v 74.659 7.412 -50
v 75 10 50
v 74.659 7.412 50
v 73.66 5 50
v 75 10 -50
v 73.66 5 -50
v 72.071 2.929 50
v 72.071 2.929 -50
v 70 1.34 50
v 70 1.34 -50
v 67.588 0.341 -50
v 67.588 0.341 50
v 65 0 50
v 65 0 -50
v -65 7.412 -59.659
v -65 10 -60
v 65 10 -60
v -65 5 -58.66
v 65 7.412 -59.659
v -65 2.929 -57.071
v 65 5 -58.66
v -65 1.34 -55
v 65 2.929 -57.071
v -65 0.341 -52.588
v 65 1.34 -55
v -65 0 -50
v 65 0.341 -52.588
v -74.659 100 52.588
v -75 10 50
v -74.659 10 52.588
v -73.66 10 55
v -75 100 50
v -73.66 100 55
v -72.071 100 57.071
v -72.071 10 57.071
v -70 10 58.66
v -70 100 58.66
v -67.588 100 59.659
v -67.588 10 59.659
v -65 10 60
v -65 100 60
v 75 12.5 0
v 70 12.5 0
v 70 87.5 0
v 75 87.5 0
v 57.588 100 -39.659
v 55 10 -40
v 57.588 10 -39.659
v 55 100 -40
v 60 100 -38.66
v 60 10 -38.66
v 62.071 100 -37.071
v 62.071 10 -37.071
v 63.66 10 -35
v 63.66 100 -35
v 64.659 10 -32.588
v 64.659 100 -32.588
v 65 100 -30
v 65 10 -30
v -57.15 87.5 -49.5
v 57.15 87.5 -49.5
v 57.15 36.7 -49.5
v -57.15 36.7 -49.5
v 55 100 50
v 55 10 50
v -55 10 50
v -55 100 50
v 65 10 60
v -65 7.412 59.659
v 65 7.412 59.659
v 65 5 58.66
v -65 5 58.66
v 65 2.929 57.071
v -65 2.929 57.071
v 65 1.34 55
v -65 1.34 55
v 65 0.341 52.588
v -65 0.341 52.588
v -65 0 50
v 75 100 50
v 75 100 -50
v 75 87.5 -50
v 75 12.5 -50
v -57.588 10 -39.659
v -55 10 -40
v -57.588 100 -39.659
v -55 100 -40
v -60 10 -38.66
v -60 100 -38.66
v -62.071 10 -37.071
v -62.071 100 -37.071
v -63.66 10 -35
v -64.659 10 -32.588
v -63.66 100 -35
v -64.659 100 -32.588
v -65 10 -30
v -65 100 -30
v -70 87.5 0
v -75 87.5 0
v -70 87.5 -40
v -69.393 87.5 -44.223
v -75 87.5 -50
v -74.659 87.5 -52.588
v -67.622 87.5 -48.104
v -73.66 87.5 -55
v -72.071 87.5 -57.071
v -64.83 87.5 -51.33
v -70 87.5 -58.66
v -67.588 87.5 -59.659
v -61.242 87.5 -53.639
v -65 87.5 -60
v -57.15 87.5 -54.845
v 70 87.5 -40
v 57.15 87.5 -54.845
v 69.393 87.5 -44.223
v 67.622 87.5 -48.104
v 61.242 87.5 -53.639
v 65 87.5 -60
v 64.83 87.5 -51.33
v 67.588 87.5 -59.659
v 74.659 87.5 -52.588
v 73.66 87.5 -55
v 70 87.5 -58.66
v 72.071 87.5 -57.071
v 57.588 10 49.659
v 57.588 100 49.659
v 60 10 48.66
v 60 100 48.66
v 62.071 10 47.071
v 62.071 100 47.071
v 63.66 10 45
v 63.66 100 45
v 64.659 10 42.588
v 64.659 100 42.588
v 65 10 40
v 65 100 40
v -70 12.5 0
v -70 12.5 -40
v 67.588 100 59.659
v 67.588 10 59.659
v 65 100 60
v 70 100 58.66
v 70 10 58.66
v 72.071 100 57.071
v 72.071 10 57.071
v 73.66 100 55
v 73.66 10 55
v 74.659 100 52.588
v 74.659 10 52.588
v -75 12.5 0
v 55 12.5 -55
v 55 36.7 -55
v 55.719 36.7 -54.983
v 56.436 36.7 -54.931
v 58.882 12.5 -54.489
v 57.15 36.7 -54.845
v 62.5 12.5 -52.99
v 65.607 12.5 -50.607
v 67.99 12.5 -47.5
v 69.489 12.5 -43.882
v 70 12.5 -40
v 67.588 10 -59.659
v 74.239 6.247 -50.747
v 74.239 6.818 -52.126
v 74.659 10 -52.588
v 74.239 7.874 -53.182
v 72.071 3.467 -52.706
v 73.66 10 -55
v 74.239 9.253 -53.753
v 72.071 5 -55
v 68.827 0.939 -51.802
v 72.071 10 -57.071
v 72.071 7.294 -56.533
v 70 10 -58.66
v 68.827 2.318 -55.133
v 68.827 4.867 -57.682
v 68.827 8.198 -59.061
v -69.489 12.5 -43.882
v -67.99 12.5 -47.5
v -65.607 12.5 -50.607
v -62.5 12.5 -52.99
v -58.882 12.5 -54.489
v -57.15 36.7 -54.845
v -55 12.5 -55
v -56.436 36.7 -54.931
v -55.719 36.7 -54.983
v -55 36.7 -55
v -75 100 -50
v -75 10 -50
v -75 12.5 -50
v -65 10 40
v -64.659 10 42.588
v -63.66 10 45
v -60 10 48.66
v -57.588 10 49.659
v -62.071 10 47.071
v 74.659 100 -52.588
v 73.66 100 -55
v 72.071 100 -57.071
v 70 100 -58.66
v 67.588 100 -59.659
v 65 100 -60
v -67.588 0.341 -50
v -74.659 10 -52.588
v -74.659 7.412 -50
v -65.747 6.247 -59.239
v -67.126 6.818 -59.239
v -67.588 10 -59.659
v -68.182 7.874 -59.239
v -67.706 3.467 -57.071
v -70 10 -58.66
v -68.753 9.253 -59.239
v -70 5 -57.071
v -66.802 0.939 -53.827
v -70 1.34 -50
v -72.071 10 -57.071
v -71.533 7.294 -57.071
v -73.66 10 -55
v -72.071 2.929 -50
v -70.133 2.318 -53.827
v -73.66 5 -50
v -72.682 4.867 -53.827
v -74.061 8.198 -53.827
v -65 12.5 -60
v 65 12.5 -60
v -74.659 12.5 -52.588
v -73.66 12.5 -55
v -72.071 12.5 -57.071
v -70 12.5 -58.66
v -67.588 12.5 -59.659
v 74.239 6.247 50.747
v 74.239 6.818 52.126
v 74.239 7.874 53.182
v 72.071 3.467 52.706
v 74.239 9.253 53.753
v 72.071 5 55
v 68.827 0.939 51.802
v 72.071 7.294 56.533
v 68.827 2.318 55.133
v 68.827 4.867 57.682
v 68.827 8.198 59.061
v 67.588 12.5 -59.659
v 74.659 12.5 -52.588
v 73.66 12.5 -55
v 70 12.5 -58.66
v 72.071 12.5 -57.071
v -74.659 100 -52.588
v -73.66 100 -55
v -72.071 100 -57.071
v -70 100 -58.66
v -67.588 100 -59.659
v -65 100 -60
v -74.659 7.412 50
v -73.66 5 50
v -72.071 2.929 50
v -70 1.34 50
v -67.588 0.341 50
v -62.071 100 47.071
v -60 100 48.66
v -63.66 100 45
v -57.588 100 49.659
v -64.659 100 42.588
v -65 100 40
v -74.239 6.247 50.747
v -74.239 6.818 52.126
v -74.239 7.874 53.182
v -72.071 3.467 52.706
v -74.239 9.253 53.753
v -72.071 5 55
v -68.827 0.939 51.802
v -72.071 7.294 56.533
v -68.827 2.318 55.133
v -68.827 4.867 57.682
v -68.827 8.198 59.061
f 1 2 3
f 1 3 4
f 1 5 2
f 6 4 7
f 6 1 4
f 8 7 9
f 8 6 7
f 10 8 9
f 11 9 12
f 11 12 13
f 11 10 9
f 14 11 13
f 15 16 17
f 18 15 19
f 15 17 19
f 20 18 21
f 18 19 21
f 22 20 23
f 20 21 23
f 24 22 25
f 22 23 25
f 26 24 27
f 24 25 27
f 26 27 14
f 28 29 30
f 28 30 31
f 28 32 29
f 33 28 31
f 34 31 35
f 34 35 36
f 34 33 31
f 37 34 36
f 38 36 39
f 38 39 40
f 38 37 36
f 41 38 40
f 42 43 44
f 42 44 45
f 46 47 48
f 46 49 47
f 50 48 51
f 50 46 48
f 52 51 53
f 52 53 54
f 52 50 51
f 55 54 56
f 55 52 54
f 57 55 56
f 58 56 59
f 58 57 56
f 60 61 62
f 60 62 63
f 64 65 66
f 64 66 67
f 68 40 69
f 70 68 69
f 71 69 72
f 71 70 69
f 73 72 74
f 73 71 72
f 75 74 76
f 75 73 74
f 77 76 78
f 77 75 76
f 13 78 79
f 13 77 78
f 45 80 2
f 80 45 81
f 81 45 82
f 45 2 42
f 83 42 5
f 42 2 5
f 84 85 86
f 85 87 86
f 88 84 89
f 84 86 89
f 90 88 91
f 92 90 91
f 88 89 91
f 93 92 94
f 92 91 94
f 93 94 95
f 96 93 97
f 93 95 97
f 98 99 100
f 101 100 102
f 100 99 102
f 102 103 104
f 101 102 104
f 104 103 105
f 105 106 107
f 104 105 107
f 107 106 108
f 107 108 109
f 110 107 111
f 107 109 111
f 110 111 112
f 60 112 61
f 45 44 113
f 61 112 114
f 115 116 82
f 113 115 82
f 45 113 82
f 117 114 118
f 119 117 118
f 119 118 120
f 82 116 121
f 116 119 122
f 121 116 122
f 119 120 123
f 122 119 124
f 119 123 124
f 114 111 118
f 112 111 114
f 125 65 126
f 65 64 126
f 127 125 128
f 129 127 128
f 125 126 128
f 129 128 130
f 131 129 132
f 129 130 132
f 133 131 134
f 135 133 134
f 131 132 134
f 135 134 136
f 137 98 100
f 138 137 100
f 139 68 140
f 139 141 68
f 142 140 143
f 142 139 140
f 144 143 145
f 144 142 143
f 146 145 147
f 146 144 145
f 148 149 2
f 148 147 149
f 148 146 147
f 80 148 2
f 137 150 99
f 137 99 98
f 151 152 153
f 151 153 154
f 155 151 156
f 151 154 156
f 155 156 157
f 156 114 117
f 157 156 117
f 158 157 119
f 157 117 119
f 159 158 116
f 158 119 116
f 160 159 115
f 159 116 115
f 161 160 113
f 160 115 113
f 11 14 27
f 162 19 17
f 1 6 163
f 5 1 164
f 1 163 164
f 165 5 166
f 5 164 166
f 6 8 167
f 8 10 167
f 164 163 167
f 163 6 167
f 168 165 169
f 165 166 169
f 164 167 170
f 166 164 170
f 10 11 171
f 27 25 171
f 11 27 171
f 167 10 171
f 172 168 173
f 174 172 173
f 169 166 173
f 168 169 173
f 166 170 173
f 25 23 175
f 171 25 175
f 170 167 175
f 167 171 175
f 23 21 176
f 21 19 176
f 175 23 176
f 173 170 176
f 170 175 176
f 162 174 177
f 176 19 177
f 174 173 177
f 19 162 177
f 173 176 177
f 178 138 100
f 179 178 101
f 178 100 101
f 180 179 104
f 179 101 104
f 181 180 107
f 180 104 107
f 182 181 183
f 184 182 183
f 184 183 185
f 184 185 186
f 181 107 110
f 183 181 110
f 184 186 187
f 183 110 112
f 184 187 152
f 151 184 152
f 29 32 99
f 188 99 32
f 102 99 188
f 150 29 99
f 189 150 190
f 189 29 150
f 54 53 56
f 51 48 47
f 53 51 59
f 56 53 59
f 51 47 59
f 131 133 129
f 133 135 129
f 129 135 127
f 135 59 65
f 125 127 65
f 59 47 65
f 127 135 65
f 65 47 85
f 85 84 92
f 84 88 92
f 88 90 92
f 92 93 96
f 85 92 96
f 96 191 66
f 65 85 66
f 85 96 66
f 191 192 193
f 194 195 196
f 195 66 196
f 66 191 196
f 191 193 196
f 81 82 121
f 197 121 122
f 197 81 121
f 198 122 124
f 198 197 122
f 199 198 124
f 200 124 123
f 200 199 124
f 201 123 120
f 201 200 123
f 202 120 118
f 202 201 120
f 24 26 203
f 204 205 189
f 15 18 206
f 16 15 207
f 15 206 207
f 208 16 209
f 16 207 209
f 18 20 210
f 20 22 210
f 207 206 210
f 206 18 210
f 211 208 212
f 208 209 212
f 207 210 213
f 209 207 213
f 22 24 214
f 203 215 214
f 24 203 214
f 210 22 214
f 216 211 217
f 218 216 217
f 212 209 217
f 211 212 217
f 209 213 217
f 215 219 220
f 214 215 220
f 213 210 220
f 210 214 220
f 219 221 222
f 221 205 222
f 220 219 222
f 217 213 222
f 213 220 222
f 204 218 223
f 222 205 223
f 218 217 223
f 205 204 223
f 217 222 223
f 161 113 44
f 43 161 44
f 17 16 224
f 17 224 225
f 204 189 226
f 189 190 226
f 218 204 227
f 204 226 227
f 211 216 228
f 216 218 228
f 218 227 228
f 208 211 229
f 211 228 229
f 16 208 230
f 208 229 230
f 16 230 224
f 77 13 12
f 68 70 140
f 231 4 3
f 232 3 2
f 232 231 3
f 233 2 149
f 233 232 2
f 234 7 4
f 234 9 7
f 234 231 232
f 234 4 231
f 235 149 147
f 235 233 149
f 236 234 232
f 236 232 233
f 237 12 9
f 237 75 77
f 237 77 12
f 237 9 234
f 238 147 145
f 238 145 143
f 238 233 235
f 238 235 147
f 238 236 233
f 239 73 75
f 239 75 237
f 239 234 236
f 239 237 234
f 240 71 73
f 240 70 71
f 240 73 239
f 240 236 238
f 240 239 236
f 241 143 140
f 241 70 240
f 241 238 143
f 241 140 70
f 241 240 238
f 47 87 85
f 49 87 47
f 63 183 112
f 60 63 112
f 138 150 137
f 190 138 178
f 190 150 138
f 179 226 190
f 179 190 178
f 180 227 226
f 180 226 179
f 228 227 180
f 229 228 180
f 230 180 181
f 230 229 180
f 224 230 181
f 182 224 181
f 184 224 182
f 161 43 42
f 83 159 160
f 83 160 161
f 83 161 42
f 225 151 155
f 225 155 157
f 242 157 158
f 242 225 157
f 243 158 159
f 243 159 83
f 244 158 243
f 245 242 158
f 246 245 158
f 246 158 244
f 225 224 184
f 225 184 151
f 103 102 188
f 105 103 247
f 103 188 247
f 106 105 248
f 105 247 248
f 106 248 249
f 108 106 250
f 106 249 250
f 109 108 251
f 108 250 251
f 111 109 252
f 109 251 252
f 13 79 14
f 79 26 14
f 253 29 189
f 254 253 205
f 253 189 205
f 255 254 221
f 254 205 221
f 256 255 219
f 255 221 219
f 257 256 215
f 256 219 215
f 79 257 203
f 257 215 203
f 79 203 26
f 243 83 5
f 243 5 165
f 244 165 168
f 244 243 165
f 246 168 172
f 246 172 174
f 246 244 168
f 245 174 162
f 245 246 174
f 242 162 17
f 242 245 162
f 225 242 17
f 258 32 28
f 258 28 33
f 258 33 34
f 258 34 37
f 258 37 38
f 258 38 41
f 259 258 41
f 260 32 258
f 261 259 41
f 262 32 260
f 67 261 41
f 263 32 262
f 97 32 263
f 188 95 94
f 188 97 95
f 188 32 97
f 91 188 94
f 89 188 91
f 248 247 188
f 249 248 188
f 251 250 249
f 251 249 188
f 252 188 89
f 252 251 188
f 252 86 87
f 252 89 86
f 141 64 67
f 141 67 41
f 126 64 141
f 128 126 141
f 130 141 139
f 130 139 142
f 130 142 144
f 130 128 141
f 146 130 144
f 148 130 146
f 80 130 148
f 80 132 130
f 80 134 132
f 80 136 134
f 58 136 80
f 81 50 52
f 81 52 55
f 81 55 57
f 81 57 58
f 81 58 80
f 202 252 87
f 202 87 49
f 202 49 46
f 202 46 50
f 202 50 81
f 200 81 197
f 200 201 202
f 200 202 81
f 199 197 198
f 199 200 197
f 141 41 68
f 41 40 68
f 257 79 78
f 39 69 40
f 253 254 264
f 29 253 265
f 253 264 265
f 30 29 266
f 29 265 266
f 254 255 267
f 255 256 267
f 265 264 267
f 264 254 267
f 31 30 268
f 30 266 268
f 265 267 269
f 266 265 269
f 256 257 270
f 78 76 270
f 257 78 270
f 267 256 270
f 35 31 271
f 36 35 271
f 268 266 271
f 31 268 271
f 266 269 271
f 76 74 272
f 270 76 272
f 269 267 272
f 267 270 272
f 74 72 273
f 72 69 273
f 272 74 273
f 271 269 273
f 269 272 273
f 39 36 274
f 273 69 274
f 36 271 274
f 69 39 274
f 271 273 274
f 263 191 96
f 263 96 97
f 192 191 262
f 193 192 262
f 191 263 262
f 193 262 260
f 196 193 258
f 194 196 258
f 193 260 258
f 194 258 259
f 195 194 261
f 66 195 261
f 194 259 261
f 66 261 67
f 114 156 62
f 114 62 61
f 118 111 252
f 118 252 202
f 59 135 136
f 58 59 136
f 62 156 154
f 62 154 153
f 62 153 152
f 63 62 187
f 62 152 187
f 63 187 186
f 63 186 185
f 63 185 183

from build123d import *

# Parameters (mm, degrees)
SKETCH1_W           = 150
SKETCH1_H           = 120
BOSS_EXTRUDE1_DEPTH = 100
FILLET1_R           = 10
SHELL1_START        = -65
SHELL1_OUTLINE_W    = 90
SHELL1_OUTLINE_H    = 100
SHELL1_DEPTH        = 130
FILLET2_R           = 10
CUT_EXTRUDE1_DEPTH  = 37.5
BOSS_EXTRUDE2_START = 90
BOSS_EXTRUDE2_DEPTH = 90
SKETCH3_W           = 114.3
SKETCH3_H           = 50.8
CUT_EXTRUDE2_DEPTH  = 5.5
FILLET3_R           = 10


# Read off the part's stored shape, not the designer's step: Shell1
with BuildPart() as part:
    # Sketch1 → Boss-Extrude1 (new body)
    with BuildSketch(Plane(origin=(0, 0, 0), x_dir=(1, 0, 0), z_dir=(0, 1, 0))):
        Rectangle(SKETCH1_W, SKETCH1_H)
    extrude(amount=BOSS_EXTRUDE1_DEPTH)

    # Fillet1
    fillet1_edges = [part.edges().sort_by_distance(p)[0] for p in [
        (0, 0, 60),
        (-75, 0, 0),
        (0, 0, -60),
        (75, 0, 0),
        (75, 50, 60),
        (-75, 50, 60),
        (-75, 50, -60),
        (75, 50, -60),
    ]]
    fillet(fillet1_edges, radius=FILLET1_R)

    # Shell1 outline → Shell1 (cut)
    with BuildSketch(Plane.YZ.offset(SHELL1_START)):
        with Locations((55, 0)):
            Rectangle(SHELL1_OUTLINE_W, SHELL1_OUTLINE_H)
    extrude(amount=SHELL1_DEPTH, mode=Mode.SUBTRACT)

    # Fillet2
    fillet2_edges = [part.edges().sort_by_distance(p)[0] for p in [
        (65, 55, -50),
        (-65, 55, -50),
        (-65, 55, 50),
        (65, 55, 50),
    ]]
    fillet(fillet2_edges, radius=FILLET2_R)

    # Sketch2 → Cut-Extrude1 (cut, symmetric)
    with BuildSketch(Plane(origin=(0, 50, 0), x_dir=(1, 0, 0), z_dir=(0, 1, 0))):
        with BuildLine():
            Line((-75, 50), (-75, 0))
            Line((-75, 0), (-70, 0))
            Line((-70, 0), (-70, 40))
            ThreePointArc((-70, 40), (-65.606601718, 50.606601718), (-55, 55))
            Line((-55, 55), (55, 55))
            ThreePointArc((55, 55), (65.606601718, 50.606601718), (70, 40))
            Line((70, 40), (70, 0))
            Line((70, 0), (75, 0))
            Line((75, 0), (75, 50))
            ThreePointArc((75, 50), (72.071067812, 57.071067812), (65, 60))
            Line((65, 60), (-65, 60))
            ThreePointArc((-65, 60), (-72.071067812, 57.071067812), (-75, 50))
        make_face()
    extrude(amount=CUT_EXTRUDE1_DEPTH, both=True, mode=Mode.SUBTRACT)

    # Sketch4 → Boss-Extrude2 (add)
    with BuildSketch(Plane(origin=(0, 10, 0), x_dir=(1, 0, 0), z_dir=(0, 1, 0)).offset(BOSS_EXTRUDE2_START)):
        with BuildLine():
            Line((-65, 40), (65, 40))
            ThreePointArc((65, 40), (62.071067812, 47.071067812), (55, 50))
            Line((55, 50), (-55, 50))
            ThreePointArc((-55, 50), (-62.071067812, 47.071067812), (-65, 40))
        make_face()
    extrude(amount=-BOSS_EXTRUDE2_DEPTH)

    # Sketch3 → Cut-Extrude2 (cut, symmetric)
    with BuildSketch(Plane(origin=(0, 0, -55), x_dir=(-1, 0, 0), z_dir=(0, 0, -1))):
        with Locations((0, 62.1)):
            Rectangle(SKETCH3_W, SKETCH3_H)
    extrude(amount=CUT_EXTRUDE2_DEPTH, both=True, mode=Mode.SUBTRACT)

    # Fillet3
    fillet3_edges = [part.edges().sort_by_distance(p)[0] for p in [
        (-65, 55, -40),
        (65, 55, -40),
    ]]
    fillet(fillet3_edges, radius=FILLET3_R)


solid = part.part
